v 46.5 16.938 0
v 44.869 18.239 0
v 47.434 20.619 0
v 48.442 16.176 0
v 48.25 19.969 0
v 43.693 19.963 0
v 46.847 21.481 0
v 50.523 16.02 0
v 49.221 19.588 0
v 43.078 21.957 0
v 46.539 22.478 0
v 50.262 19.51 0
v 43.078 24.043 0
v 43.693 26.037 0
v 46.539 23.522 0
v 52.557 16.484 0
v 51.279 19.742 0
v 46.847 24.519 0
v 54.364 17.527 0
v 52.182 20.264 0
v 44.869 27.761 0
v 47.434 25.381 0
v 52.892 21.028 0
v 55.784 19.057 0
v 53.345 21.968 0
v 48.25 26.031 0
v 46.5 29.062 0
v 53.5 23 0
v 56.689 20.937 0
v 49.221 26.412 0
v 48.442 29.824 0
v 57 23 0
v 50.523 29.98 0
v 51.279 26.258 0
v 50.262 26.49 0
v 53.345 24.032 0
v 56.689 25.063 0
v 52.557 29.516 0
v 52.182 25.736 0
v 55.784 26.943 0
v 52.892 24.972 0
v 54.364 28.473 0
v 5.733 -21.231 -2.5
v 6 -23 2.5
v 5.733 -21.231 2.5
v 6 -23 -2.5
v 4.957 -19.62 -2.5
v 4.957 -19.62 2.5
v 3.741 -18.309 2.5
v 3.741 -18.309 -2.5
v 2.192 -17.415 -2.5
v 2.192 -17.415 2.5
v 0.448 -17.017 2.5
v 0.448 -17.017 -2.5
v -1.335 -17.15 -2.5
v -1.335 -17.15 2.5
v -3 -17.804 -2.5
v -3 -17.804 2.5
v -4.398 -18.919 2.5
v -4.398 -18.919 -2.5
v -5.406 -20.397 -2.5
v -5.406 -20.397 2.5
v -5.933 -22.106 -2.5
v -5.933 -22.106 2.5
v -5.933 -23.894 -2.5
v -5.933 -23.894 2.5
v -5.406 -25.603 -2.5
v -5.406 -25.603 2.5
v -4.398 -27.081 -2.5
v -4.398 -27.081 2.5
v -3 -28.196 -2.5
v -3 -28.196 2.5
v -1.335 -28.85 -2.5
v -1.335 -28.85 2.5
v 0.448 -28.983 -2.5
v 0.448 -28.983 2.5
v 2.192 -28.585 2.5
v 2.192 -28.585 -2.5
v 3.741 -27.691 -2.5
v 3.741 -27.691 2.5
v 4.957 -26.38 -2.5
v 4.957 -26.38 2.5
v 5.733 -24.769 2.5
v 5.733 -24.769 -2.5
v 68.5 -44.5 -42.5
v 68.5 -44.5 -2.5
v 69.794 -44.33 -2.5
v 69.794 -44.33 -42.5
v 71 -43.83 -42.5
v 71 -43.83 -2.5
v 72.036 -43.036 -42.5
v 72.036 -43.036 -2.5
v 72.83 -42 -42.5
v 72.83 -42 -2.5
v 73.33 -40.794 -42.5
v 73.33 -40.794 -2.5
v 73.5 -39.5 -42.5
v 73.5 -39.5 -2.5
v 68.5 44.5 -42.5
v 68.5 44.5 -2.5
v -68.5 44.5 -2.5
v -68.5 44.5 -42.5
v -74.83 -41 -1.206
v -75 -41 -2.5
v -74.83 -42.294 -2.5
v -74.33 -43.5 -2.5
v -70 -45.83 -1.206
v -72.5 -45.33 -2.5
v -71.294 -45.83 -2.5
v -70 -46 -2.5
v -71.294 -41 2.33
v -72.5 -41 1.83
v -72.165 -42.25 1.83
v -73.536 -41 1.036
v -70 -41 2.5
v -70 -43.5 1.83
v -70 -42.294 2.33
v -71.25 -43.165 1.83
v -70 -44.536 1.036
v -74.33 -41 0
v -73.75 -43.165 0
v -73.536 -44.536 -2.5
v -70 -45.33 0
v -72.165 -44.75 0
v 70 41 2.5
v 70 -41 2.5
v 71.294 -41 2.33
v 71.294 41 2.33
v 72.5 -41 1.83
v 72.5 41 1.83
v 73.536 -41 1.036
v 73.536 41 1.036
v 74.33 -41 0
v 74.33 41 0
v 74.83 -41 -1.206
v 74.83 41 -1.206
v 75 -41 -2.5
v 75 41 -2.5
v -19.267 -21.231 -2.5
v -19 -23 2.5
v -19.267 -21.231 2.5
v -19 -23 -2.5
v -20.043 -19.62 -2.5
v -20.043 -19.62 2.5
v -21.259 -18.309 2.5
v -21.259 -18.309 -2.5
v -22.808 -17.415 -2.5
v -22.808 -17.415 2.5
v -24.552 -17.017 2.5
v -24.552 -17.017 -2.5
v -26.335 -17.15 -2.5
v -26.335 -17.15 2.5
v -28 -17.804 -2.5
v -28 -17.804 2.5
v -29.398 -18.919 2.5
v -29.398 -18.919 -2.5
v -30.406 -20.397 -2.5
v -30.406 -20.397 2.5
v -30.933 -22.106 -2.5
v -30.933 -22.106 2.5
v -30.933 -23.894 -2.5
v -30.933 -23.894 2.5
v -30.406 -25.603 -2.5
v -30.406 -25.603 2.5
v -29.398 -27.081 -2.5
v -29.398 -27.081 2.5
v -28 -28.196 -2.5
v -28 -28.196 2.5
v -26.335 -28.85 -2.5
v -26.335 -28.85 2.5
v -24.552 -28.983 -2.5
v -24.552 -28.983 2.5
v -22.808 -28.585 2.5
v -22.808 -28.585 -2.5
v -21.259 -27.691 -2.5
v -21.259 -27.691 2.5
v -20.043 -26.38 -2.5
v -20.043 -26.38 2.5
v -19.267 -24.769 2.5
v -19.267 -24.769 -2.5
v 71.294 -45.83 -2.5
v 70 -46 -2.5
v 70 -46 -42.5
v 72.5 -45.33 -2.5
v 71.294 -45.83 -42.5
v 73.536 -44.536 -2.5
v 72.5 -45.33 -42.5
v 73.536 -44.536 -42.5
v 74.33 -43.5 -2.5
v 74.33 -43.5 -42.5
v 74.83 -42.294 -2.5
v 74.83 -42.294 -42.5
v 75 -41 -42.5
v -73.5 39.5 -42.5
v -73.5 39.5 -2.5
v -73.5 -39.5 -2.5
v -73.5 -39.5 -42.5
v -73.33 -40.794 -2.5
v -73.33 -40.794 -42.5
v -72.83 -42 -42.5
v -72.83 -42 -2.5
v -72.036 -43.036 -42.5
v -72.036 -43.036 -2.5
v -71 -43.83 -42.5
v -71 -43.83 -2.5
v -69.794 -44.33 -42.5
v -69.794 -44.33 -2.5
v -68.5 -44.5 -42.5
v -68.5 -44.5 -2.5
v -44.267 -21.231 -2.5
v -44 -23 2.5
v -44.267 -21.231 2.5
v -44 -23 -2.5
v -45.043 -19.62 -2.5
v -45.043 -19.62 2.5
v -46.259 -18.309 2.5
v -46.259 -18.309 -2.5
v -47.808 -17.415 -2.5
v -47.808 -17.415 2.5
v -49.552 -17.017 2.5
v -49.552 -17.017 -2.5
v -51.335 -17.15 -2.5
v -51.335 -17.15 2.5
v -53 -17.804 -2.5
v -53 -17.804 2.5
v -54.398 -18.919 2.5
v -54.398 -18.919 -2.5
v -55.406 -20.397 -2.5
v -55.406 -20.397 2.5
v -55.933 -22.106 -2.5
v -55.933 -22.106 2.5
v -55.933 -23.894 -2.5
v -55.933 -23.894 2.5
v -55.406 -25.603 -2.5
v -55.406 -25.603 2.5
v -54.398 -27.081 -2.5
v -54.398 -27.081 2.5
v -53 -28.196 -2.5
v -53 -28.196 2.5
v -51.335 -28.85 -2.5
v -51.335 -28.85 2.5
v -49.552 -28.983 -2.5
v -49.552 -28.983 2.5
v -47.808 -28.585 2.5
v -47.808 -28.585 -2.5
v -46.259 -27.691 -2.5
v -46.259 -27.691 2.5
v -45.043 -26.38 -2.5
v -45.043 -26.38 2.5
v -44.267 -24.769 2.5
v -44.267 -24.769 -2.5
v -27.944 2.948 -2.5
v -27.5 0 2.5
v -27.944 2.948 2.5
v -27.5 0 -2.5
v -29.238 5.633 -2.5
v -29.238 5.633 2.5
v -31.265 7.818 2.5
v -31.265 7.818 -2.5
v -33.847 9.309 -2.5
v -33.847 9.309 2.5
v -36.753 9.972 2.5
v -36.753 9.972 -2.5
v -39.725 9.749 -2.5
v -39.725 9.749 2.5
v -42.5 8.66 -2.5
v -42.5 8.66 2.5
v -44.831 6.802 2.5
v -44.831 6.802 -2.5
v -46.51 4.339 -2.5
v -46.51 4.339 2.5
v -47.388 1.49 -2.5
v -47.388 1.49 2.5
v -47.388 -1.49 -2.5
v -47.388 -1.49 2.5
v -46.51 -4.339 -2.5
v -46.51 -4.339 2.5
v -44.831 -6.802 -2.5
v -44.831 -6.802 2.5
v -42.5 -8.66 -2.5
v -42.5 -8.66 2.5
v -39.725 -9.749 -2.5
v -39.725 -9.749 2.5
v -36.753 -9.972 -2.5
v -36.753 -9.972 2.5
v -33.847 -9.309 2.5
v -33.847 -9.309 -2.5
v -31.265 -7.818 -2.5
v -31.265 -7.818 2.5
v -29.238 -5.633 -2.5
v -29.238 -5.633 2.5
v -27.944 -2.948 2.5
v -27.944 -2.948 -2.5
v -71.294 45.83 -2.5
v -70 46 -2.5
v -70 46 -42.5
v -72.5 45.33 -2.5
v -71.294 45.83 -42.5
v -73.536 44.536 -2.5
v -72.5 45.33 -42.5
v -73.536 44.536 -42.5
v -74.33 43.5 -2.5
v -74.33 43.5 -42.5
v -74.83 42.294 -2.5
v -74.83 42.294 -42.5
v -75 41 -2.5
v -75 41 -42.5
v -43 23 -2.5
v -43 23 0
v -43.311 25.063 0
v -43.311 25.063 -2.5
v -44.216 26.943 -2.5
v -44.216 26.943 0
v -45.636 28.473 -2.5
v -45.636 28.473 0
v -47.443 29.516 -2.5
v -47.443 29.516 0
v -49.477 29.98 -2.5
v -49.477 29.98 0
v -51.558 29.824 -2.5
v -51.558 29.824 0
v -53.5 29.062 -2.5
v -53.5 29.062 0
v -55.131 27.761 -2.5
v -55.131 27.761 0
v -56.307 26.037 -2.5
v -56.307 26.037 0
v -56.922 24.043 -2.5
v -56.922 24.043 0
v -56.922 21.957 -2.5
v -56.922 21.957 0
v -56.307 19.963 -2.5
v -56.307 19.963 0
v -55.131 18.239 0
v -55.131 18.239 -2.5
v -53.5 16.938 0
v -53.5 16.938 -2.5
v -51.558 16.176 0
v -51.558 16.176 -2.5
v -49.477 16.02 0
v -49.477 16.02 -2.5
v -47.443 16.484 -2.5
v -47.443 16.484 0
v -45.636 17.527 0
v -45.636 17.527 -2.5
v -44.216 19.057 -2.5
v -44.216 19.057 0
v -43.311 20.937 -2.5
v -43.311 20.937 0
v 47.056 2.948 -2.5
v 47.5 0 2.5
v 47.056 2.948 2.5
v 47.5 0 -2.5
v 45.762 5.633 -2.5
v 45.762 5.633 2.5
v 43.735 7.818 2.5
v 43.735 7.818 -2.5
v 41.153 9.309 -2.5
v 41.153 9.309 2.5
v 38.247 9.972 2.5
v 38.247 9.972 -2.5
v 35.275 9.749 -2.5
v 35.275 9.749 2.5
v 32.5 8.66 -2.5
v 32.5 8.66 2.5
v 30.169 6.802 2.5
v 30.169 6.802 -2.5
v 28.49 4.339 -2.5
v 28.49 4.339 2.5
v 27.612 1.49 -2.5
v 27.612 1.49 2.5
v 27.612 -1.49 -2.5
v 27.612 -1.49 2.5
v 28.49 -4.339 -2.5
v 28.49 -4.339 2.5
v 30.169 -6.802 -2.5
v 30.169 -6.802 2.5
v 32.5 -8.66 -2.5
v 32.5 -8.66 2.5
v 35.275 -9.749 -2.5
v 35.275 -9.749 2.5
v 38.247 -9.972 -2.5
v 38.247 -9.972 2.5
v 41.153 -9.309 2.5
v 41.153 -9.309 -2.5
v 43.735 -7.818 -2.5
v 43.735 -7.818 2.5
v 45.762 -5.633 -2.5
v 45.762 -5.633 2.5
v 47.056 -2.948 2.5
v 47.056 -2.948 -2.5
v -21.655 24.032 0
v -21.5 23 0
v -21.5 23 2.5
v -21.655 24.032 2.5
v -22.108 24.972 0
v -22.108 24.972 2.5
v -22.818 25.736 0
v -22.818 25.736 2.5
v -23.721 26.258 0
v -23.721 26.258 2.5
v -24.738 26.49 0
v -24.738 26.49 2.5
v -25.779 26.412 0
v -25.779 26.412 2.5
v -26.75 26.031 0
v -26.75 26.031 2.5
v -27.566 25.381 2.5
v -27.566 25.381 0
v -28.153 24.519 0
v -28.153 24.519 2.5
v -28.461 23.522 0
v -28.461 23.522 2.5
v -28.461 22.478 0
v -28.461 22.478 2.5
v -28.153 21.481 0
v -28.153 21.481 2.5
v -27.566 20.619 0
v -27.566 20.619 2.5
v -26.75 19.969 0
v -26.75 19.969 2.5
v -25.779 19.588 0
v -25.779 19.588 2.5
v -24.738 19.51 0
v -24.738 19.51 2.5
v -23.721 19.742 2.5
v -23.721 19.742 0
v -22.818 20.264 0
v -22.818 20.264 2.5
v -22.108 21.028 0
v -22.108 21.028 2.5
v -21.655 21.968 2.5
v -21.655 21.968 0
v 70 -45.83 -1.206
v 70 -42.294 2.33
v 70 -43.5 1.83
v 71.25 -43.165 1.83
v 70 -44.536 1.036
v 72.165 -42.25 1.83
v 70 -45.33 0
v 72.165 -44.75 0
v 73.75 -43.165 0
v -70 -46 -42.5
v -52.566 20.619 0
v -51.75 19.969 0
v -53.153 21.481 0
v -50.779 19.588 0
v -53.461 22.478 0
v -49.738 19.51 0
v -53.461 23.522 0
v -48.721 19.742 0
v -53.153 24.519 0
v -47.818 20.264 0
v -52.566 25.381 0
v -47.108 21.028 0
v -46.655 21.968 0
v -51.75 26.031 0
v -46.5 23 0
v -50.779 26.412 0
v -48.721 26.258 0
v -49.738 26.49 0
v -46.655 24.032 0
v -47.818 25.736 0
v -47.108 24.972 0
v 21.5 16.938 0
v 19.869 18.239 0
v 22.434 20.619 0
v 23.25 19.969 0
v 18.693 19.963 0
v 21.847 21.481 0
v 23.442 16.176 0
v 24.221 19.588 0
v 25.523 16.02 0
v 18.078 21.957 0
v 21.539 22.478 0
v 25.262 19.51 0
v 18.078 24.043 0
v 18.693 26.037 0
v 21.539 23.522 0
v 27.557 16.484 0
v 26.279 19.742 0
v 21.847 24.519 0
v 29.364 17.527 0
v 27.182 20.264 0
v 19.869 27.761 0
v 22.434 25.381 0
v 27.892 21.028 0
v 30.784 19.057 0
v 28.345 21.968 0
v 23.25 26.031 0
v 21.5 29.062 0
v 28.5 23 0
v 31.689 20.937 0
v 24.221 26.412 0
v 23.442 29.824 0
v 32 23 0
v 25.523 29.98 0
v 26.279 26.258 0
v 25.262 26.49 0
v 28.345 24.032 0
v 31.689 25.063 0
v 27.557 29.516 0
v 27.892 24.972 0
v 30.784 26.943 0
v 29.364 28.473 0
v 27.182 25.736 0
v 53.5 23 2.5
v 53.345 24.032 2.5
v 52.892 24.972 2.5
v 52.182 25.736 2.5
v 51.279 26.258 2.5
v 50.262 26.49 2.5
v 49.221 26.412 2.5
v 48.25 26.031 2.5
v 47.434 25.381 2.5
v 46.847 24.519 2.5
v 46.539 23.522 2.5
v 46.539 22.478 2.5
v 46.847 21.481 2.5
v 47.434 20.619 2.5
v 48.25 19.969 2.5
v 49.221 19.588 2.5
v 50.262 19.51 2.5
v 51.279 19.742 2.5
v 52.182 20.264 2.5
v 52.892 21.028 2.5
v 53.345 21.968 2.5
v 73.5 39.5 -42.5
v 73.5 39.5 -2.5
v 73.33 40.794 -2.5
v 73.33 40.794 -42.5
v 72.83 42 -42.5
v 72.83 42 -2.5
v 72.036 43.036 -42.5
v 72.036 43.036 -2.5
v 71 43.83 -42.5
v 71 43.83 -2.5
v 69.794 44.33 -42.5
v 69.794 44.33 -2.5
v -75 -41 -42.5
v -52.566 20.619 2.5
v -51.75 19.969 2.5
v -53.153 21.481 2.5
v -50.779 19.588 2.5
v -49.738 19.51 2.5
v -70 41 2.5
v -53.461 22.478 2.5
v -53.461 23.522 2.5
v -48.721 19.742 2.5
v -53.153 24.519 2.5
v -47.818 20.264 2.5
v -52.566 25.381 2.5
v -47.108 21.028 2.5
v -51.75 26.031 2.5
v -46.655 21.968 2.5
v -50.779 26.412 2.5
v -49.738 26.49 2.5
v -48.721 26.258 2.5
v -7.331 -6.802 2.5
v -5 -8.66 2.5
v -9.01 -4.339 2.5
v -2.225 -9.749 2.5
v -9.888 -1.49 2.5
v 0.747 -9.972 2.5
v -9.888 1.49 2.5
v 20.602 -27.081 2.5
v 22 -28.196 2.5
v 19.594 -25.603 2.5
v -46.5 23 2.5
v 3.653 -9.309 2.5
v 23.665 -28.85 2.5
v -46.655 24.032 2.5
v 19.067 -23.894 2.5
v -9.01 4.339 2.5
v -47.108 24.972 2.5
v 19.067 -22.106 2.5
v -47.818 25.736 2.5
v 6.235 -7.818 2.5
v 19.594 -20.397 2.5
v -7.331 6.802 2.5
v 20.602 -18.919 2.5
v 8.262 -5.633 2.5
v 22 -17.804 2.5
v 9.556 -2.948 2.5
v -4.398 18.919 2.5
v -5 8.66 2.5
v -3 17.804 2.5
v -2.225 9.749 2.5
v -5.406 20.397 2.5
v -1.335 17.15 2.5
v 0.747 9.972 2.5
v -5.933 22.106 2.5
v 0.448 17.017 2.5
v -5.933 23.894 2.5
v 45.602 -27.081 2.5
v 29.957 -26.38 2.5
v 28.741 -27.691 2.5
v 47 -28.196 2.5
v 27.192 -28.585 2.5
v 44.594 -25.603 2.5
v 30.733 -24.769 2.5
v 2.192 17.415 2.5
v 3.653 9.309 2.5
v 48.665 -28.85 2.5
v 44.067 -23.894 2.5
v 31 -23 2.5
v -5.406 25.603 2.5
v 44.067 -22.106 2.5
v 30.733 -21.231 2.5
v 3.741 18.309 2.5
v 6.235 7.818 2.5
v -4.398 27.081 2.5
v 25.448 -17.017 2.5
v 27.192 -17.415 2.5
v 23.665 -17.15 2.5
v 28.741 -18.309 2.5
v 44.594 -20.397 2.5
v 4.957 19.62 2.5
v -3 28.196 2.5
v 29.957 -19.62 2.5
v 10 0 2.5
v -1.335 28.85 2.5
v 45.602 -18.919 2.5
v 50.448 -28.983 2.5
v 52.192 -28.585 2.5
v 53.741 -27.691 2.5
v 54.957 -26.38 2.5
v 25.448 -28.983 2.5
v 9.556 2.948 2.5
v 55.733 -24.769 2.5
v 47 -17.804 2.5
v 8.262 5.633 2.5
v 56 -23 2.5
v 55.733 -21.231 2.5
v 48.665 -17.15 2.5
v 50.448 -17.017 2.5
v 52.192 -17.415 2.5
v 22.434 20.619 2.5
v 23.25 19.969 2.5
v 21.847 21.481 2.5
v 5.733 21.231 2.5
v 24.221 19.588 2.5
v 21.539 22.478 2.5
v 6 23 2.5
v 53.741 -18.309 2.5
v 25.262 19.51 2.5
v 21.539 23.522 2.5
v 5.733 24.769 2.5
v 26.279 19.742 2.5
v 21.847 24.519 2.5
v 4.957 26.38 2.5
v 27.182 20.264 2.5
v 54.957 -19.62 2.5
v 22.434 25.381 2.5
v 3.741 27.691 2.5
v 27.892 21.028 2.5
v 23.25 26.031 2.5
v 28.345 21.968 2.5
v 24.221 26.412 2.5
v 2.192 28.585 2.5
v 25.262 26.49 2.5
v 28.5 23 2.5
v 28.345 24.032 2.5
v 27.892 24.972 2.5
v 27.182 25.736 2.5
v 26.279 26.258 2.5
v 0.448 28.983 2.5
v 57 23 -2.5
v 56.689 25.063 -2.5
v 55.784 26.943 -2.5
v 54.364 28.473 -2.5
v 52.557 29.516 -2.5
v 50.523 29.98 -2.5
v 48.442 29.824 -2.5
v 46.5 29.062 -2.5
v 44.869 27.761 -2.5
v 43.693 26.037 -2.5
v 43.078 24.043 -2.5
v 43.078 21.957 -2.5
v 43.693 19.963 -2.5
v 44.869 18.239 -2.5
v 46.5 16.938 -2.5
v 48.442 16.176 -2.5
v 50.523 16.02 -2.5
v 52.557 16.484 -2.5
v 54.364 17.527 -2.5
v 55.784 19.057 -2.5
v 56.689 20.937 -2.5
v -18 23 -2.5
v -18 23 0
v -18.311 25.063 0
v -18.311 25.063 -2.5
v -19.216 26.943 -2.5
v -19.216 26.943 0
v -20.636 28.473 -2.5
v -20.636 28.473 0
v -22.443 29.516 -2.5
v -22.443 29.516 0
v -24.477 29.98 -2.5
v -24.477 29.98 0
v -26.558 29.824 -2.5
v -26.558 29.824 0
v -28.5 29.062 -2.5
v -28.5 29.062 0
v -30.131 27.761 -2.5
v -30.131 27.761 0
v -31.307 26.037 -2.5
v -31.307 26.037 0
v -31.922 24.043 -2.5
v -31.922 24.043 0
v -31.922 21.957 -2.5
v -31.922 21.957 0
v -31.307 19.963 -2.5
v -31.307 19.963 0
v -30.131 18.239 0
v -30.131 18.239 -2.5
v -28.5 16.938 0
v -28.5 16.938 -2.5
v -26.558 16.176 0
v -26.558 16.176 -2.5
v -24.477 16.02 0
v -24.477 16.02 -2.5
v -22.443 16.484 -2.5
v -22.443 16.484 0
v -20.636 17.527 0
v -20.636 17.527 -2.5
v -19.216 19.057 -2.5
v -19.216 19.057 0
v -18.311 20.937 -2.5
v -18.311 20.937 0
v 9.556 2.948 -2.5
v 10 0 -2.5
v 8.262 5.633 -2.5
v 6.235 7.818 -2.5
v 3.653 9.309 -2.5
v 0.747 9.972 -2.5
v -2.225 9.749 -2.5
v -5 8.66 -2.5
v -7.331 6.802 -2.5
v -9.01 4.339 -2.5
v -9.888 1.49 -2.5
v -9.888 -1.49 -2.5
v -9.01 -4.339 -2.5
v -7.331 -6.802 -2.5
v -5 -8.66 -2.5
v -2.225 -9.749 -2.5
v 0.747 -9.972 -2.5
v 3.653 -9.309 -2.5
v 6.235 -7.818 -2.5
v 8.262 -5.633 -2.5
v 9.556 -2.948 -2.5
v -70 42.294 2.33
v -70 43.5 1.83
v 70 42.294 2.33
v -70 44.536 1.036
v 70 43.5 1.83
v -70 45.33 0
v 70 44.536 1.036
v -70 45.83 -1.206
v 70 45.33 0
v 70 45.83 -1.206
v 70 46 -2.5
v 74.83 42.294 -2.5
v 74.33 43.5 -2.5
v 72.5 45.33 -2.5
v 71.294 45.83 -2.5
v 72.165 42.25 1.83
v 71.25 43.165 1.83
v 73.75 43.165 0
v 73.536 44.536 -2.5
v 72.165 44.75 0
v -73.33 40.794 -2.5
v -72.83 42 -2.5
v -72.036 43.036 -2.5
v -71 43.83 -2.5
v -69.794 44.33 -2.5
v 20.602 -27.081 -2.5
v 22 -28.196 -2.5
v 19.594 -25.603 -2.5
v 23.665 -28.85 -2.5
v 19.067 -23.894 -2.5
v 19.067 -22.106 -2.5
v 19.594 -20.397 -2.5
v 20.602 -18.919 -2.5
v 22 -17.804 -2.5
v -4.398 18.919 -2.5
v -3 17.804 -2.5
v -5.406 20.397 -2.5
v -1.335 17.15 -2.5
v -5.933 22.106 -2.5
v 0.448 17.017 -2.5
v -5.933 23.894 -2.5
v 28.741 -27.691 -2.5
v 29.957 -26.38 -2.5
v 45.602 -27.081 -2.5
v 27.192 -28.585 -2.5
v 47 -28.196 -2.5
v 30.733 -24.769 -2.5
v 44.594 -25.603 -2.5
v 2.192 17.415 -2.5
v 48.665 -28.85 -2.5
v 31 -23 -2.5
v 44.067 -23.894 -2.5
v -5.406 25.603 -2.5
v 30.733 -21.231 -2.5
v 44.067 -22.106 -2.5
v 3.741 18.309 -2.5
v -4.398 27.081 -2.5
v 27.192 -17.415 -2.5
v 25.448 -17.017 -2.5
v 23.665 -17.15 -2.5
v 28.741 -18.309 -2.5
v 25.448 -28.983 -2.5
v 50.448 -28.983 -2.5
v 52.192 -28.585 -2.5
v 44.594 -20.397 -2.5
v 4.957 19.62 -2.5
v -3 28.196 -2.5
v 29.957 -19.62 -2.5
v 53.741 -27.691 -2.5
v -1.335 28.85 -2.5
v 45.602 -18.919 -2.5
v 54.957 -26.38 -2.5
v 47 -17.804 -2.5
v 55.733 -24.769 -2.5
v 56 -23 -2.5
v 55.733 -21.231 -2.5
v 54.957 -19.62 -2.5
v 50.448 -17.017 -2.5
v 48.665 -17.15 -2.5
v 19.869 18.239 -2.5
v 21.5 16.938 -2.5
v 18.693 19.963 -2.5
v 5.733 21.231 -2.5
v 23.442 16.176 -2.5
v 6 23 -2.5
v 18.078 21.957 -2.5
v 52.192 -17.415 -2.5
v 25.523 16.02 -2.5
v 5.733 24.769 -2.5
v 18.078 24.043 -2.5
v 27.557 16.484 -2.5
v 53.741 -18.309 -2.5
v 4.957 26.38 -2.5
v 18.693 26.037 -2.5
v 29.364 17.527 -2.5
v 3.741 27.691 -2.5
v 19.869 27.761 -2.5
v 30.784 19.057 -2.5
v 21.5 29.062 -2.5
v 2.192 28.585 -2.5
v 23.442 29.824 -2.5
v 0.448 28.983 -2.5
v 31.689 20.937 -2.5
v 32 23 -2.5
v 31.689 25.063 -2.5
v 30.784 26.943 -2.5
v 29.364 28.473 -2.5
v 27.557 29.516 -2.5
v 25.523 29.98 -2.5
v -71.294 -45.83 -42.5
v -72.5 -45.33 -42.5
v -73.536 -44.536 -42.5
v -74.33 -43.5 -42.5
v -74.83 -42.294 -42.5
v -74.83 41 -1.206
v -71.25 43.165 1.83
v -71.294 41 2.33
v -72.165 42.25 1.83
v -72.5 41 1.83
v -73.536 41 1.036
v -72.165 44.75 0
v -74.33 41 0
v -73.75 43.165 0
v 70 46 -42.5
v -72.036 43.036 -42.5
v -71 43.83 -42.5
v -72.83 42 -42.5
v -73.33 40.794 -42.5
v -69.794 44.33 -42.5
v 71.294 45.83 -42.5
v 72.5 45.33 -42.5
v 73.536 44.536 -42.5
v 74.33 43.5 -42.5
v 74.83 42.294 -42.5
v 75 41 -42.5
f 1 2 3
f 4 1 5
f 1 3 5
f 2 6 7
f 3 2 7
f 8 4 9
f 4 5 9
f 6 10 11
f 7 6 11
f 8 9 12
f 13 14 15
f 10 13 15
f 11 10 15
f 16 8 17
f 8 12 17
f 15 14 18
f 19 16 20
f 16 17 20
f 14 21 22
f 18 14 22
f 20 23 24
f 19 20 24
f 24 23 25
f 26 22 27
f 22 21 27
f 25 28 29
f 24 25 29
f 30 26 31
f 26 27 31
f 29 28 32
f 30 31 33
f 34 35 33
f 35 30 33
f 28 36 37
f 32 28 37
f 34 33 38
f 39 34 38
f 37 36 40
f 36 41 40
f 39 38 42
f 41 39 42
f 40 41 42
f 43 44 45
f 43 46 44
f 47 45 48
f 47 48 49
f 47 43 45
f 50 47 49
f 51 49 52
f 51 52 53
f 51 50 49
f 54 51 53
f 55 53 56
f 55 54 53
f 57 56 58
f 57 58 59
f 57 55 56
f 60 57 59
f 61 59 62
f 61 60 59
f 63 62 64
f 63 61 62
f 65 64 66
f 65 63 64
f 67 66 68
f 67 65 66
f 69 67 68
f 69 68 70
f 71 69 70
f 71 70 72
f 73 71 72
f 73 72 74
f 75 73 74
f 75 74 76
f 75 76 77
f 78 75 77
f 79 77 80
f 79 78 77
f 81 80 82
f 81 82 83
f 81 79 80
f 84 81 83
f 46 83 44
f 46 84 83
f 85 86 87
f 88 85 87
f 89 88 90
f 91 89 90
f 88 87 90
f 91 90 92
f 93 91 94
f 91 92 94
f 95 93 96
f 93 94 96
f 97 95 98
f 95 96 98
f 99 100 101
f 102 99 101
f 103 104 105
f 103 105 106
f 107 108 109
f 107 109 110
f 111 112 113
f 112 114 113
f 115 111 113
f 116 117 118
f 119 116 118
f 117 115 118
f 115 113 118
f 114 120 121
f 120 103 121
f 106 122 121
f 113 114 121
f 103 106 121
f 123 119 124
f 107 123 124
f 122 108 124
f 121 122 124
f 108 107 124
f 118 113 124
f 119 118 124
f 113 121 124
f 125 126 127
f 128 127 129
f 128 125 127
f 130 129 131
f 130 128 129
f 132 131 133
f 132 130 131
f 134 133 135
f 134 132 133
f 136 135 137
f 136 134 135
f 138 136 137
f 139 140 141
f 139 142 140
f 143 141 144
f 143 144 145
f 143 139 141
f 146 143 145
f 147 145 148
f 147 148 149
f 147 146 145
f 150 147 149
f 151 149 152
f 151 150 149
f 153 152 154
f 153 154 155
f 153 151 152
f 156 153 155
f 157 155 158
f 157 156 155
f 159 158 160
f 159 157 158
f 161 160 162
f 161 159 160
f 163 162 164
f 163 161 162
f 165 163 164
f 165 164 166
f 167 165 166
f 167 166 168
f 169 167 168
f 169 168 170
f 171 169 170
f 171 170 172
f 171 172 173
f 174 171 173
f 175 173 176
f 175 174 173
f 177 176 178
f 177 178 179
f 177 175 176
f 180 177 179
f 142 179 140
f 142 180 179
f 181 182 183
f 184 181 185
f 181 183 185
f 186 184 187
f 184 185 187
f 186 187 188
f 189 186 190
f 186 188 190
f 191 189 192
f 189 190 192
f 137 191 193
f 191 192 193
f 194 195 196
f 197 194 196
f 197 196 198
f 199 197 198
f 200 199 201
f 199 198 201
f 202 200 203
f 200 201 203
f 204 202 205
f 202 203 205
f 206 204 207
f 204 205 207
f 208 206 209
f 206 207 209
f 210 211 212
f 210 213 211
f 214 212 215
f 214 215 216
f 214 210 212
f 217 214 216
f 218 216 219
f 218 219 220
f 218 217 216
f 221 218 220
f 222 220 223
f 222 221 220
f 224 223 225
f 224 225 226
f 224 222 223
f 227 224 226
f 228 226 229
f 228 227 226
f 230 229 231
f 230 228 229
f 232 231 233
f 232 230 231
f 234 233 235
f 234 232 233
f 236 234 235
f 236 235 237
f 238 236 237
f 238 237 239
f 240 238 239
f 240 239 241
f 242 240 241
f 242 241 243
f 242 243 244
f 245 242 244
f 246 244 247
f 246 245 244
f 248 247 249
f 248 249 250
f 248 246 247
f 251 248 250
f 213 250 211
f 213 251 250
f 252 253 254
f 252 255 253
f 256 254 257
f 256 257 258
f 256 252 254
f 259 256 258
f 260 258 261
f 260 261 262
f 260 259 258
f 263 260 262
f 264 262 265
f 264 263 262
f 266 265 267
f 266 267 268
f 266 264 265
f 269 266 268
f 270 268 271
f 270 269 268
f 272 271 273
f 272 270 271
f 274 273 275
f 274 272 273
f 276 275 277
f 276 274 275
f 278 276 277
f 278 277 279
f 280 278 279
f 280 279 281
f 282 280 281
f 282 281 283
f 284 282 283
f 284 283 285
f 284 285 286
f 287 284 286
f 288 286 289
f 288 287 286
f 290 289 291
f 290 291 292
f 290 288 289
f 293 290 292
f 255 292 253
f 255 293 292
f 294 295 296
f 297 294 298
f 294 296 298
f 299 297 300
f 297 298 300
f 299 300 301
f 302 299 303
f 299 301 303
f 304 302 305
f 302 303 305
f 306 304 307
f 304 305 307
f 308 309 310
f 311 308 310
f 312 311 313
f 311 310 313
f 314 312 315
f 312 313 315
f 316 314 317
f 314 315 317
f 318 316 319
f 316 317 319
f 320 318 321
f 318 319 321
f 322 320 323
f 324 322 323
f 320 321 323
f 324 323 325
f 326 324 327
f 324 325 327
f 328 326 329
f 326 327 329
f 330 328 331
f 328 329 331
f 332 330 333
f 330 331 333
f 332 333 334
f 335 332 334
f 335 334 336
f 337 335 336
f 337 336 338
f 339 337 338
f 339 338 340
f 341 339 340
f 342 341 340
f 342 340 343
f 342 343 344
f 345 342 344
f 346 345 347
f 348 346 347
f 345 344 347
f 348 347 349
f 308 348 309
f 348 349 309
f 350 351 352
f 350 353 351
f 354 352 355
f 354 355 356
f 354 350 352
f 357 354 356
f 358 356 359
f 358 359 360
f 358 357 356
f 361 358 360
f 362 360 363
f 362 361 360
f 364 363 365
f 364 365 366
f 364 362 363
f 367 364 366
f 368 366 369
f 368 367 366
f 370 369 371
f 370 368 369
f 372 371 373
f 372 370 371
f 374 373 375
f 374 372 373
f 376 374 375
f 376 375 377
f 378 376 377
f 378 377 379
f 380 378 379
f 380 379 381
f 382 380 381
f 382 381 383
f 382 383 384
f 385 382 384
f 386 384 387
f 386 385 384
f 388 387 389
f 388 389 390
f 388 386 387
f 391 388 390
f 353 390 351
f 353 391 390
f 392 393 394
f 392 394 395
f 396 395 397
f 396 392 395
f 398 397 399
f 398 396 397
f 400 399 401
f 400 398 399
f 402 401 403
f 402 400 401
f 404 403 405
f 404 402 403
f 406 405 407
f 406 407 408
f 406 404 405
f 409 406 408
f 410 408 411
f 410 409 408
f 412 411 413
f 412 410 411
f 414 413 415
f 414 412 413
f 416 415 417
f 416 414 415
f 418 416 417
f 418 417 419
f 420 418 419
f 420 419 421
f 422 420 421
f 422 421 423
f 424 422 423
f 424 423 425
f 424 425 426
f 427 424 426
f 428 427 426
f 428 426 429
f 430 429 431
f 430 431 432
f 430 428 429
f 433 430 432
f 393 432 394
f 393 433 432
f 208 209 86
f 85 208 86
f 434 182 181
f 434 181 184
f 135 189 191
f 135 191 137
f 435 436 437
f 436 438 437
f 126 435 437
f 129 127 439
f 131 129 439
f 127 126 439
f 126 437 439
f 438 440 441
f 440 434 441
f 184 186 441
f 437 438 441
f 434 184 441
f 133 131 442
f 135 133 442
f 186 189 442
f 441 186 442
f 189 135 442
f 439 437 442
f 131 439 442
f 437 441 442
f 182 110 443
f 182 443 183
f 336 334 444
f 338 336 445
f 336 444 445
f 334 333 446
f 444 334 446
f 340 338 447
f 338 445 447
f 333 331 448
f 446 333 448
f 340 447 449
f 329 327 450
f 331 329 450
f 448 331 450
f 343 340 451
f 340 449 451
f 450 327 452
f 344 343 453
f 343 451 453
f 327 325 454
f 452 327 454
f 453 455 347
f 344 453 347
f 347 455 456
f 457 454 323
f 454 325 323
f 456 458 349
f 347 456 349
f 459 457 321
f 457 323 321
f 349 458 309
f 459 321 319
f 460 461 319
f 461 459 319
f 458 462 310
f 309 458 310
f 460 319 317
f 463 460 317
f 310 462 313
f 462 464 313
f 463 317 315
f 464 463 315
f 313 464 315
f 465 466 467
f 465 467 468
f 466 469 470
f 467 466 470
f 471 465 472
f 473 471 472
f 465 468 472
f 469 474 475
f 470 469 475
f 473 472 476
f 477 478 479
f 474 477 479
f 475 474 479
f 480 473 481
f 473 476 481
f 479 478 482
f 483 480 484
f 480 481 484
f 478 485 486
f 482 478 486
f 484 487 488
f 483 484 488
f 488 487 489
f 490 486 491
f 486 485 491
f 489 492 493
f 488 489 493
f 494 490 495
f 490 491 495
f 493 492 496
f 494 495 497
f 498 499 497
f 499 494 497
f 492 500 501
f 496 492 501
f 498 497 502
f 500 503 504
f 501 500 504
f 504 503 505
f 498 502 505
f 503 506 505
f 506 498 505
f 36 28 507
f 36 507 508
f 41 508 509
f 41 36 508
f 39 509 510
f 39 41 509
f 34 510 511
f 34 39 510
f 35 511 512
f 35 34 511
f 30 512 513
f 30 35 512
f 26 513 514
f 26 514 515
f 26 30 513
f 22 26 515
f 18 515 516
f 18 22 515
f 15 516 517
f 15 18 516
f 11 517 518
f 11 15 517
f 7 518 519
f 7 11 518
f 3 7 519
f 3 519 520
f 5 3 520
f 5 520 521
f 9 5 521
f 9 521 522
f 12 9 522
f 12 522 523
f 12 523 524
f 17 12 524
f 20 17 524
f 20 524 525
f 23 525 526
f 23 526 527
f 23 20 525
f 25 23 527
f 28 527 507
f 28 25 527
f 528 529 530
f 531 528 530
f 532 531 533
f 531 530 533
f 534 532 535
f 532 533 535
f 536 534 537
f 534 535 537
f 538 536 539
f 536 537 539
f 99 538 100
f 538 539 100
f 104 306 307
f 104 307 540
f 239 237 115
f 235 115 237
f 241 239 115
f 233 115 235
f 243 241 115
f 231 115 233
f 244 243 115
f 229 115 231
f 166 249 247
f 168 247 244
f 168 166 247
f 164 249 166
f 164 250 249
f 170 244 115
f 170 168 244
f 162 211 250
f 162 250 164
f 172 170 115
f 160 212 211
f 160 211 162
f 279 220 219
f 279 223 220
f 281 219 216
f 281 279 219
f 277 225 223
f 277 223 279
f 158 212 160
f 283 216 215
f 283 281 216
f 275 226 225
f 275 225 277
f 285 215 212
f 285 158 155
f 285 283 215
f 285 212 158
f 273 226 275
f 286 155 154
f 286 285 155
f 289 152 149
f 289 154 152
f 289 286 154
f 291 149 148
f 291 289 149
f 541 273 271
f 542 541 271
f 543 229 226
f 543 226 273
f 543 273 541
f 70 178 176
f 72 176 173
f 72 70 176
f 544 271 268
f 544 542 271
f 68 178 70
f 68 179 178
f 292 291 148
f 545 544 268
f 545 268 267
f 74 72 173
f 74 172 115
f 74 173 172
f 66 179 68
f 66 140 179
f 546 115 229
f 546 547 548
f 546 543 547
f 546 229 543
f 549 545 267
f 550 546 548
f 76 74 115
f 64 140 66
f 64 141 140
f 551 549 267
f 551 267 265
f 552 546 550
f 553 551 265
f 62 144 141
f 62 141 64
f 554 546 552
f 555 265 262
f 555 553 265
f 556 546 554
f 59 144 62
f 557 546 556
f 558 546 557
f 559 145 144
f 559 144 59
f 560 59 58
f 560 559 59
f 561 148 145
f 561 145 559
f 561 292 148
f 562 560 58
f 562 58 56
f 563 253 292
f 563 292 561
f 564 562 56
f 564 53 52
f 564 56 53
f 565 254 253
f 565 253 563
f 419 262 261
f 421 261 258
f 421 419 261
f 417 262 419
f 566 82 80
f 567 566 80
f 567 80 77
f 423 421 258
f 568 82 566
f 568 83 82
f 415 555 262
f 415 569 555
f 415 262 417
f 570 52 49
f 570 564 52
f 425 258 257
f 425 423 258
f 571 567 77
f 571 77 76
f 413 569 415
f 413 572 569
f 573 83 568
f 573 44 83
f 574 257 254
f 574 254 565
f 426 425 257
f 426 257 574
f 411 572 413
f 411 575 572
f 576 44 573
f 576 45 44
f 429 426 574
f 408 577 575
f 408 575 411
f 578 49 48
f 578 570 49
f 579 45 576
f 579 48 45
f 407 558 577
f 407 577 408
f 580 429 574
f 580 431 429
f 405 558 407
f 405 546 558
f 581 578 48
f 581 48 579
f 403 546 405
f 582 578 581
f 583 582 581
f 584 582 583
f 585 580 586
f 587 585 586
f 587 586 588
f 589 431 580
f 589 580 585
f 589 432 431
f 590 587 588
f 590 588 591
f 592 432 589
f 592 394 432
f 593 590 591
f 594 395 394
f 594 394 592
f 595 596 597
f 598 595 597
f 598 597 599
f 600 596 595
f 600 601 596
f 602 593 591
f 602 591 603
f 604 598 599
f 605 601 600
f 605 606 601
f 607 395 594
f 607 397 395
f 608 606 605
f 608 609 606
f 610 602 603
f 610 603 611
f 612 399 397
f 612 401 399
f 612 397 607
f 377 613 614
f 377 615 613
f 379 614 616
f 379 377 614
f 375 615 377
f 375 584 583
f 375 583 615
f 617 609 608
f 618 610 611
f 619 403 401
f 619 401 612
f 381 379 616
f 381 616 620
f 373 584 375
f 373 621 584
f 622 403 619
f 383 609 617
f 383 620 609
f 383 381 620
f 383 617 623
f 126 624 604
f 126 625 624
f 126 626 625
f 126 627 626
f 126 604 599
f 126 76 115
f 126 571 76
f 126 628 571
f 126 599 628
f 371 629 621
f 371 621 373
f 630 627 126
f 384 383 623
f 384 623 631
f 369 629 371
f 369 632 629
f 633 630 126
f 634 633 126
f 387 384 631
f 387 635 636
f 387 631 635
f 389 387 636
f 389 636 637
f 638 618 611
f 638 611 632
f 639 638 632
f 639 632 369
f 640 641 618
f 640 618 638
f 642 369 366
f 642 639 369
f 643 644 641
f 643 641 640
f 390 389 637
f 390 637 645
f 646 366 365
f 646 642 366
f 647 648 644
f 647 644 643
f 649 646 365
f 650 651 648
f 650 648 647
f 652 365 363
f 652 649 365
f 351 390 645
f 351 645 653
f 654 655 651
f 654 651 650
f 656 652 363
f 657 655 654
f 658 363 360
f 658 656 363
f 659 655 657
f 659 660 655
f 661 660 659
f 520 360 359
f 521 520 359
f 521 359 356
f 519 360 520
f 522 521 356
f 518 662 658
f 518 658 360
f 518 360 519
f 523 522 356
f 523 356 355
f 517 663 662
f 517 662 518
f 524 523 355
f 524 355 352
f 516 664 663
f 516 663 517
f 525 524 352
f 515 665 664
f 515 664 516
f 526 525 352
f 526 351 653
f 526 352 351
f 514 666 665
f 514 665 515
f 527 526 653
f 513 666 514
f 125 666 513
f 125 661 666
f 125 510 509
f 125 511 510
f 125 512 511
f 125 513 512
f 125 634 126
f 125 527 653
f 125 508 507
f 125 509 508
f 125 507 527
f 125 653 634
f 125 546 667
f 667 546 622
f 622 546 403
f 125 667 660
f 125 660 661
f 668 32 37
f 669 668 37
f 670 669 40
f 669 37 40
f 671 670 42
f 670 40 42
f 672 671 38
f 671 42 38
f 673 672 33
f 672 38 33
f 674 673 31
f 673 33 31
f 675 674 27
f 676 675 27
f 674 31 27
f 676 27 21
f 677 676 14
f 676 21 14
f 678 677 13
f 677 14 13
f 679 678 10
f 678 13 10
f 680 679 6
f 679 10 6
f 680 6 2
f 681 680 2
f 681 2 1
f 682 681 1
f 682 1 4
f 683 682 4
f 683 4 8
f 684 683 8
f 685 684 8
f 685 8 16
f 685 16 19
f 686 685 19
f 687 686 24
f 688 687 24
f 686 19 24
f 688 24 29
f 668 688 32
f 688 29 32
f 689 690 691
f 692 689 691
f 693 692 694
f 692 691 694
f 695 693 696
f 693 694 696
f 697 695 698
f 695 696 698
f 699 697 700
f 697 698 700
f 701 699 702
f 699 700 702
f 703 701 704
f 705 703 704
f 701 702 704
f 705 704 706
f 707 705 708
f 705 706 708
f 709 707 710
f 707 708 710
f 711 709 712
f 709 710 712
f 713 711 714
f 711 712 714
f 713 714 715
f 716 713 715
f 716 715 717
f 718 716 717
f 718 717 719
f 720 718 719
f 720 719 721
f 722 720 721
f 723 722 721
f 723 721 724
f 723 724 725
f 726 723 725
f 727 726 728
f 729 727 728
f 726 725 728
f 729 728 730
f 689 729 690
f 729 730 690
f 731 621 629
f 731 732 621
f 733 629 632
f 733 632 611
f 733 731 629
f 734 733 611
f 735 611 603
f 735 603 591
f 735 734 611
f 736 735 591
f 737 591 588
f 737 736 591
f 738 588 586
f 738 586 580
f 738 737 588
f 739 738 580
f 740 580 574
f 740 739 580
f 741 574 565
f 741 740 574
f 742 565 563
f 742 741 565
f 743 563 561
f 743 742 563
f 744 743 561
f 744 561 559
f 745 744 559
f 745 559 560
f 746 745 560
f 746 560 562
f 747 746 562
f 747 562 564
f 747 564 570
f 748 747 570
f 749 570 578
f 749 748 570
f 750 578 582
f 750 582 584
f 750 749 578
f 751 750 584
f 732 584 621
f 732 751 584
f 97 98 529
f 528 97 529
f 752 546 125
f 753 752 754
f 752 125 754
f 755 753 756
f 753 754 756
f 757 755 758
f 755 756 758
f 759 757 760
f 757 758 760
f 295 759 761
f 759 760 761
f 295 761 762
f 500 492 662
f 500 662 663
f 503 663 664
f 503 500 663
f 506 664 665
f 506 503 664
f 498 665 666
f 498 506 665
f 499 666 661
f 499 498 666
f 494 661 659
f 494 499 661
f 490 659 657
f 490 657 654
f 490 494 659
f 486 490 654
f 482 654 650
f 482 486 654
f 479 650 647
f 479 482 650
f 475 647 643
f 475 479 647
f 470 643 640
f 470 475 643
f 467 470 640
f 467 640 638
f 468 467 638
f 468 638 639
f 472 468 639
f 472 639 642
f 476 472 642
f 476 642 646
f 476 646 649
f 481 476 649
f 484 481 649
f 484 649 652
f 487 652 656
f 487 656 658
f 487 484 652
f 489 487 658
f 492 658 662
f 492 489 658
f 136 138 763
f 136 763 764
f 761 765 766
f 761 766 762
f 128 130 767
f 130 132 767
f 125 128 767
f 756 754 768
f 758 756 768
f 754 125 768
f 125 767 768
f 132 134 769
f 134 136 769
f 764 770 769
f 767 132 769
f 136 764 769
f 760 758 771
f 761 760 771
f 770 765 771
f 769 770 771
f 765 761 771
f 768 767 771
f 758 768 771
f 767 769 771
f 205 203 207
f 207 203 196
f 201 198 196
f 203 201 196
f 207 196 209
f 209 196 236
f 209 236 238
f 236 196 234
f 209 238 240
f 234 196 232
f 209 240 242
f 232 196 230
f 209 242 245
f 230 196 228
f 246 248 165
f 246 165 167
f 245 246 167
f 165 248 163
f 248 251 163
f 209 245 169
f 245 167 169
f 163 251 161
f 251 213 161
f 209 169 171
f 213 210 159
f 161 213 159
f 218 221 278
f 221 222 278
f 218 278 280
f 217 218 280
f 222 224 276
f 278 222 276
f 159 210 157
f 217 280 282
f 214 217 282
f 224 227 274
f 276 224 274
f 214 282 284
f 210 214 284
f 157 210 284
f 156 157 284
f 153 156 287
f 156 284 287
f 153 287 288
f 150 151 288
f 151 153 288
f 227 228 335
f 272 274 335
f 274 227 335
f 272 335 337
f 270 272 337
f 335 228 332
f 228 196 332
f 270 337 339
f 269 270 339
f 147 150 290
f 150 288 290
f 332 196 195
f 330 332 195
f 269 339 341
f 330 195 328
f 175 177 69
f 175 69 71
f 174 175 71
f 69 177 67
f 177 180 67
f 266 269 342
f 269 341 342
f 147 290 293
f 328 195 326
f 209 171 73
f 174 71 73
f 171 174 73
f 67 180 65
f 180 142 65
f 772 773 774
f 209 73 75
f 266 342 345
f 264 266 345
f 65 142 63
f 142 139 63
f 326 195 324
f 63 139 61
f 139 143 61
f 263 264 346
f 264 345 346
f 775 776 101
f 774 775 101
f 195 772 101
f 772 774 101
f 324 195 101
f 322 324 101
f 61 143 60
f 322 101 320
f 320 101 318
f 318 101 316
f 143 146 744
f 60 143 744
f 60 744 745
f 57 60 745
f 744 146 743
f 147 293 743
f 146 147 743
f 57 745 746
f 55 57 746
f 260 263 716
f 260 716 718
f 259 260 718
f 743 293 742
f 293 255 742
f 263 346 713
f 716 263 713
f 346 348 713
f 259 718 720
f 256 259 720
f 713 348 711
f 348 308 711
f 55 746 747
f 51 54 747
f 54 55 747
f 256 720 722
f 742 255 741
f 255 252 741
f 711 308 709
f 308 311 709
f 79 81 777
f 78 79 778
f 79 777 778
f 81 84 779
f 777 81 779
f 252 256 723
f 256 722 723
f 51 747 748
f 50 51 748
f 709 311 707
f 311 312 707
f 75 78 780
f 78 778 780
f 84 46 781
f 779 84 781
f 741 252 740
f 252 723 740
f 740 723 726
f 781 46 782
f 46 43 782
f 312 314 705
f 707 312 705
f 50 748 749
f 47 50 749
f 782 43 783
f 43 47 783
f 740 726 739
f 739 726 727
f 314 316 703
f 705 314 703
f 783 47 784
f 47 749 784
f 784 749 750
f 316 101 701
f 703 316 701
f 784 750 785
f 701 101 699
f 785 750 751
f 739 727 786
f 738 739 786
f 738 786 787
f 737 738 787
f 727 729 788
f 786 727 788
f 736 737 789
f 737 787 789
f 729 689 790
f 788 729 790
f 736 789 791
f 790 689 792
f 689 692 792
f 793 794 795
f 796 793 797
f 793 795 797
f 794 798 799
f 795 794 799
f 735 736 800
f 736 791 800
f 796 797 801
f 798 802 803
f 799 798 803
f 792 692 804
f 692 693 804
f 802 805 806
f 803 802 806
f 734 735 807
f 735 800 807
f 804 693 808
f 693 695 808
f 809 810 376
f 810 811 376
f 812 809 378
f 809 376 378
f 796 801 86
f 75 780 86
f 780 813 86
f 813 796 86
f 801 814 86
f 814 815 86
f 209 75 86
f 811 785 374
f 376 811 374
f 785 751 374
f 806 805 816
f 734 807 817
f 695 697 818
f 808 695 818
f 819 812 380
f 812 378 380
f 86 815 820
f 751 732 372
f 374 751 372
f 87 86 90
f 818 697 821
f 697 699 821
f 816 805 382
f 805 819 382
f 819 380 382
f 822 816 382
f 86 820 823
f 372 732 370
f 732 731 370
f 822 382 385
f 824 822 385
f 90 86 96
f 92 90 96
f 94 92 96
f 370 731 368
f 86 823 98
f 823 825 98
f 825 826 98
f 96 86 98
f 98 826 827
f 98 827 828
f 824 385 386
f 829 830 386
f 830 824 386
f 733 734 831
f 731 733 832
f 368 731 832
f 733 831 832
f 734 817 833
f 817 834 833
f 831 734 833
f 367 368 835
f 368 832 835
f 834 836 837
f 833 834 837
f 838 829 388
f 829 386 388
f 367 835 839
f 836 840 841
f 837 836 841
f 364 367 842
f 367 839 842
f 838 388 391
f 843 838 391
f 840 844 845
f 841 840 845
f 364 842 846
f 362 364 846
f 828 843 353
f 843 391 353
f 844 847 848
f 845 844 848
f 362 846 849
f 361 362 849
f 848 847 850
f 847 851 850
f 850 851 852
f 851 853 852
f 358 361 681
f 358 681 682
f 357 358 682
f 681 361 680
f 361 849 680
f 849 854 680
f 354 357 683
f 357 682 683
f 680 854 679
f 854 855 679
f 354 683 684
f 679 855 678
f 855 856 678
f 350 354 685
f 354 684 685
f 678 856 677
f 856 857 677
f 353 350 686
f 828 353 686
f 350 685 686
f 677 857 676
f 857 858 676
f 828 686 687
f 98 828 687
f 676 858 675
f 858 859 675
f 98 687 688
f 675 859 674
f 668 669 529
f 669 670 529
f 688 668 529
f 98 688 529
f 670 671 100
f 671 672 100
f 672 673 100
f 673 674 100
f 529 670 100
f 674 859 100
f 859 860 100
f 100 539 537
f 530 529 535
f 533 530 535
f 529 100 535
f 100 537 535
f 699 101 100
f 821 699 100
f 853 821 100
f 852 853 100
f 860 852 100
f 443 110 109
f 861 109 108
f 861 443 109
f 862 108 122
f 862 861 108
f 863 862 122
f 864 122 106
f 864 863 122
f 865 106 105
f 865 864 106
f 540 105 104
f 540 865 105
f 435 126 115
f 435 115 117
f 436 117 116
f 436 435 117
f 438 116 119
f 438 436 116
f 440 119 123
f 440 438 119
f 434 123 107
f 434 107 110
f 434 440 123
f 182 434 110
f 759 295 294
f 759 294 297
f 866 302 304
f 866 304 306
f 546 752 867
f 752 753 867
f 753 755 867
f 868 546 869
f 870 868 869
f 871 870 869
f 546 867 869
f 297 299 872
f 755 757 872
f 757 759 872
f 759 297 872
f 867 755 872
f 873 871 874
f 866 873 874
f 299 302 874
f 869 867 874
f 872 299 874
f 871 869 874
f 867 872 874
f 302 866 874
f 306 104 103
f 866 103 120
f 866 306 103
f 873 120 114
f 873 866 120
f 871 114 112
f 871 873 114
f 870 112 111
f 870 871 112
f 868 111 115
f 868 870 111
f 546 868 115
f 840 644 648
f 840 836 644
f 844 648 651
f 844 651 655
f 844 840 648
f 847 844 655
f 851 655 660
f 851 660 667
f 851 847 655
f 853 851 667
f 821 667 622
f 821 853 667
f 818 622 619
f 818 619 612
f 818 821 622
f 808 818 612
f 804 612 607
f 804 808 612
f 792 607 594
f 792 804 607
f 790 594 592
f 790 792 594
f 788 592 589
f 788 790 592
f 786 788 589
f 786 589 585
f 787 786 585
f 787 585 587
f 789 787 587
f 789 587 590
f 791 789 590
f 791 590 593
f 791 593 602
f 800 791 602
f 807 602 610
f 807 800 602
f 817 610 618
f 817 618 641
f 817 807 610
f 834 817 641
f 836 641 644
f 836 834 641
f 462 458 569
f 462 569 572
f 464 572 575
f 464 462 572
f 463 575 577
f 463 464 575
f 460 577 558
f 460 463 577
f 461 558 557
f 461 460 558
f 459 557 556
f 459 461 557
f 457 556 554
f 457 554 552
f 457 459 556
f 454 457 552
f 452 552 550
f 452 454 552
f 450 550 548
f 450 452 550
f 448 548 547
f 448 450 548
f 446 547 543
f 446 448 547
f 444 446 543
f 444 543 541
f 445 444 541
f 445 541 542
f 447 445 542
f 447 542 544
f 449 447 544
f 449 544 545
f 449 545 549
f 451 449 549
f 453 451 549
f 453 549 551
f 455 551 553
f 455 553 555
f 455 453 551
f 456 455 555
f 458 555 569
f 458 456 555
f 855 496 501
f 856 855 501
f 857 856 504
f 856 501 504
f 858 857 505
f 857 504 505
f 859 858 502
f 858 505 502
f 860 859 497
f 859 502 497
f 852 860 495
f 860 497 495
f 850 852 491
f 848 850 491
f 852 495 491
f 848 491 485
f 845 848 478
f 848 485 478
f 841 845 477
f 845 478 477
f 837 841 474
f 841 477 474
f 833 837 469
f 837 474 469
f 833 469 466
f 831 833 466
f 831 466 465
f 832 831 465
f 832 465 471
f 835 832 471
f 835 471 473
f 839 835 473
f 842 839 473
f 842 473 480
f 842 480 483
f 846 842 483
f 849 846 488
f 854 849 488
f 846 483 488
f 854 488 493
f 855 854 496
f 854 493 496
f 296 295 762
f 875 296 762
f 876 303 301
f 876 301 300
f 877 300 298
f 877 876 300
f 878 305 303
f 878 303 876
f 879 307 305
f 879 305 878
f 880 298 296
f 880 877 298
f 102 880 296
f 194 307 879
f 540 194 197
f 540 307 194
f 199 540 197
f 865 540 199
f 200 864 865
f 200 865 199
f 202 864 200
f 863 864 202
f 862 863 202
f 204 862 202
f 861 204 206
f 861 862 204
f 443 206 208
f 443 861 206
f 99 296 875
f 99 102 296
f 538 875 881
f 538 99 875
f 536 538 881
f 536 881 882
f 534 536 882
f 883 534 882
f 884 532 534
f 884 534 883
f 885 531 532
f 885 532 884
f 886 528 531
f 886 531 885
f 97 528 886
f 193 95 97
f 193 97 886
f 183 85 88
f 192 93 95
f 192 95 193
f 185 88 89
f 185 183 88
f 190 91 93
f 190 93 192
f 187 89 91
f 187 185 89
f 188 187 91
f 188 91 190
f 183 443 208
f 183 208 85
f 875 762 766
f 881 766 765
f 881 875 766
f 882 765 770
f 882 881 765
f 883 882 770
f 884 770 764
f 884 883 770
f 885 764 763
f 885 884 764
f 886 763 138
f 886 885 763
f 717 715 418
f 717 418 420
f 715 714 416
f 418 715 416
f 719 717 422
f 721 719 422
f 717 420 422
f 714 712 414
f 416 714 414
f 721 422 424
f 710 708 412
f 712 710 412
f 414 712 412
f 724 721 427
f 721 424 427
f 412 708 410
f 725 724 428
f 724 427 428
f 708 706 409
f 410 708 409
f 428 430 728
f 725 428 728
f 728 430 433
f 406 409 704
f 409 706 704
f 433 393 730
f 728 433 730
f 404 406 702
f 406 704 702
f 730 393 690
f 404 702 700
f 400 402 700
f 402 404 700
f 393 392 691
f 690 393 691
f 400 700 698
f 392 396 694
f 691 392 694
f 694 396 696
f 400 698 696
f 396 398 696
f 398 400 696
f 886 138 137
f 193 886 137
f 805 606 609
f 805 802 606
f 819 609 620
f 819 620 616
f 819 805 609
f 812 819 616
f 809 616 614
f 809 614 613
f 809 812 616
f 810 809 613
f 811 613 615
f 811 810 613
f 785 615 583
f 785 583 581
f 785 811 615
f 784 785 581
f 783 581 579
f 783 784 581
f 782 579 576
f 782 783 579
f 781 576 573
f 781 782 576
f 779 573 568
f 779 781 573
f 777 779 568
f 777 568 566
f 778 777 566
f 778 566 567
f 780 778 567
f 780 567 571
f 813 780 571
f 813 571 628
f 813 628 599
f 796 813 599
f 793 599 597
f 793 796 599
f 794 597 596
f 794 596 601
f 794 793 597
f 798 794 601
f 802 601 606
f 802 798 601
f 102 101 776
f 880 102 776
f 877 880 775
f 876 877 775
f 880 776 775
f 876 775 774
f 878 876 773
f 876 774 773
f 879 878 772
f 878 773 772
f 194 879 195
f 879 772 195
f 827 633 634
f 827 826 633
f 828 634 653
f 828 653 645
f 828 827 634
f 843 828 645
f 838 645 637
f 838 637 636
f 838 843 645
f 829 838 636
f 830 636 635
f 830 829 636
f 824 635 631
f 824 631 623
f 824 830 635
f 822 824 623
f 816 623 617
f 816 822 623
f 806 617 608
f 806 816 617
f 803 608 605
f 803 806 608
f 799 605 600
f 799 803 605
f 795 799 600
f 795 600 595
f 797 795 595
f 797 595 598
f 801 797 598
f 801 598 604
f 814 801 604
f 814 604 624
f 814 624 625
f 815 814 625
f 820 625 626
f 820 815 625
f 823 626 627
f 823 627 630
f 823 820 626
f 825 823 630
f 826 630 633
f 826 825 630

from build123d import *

# Parameters (mm, degrees)
F0_W         = 150
F0_H         = 92
F0_R         = 6
F0_R_2       = 10
F0_R_3       = 3.5
F1_DEPTH     = 2.5
F2_W         = 150
F2_H         = 92
F2_R         = 6
F2_R_2       = 10
F2_R_3       = 7
F3_DEPTH     = 2.5
F4_R         = 4.99999
F5_W         = 150
F5_H         = 92
F6_DEPTH     = 40
F7_T1_DEPTH  = 57.5
F7_T4_ANGLE  = 90
F7_T6_ANGLE  = 90
F7_T8_ANGLE  = 90
F7_T10_ANGLE = 90


# Not quite as in the source:
# - a fillet or chamfer that OpenCascade refuses, or shapes differently, is made with other operations: its cross-section is extruded or revolved along the edge and cut away or added
# - a fillet or chamfer is up to 0.001 mm smaller than in the source, because OpenCascade refuses the exact size


with BuildPart() as f1:
    # F0 (on Top) → F1 (new body)
    with BuildSketch(Plane.XY):
        Rectangle(F0_W, F0_H)
        with Locations((-50, -23)):
            Circle(F0_R, mode=Mode.SUBTRACT)
        with Locations((-25, -23)):
            Circle(F0_R, mode=Mode.SUBTRACT)
        with Locations((0, -23)):
            Circle(F0_R, mode=Mode.SUBTRACT)
        with Locations((25, -23)):
            Circle(F0_R, mode=Mode.SUBTRACT)
        with Locations((50, -23)):
            Circle(F0_R, mode=Mode.SUBTRACT)
        with Locations((-37.5, 0)):
            Circle(F0_R_2, mode=Mode.SUBTRACT)
        with Locations((-50, 23)):
            Circle(F0_R_3, mode=Mode.SUBTRACT)
        with Locations((-25, 23)):
            Circle(F0_R_3, mode=Mode.SUBTRACT)
        Circle(F0_R_2, mode=Mode.SUBTRACT)
        with Locations((37.5, 0)):
            Circle(F0_R_2, mode=Mode.SUBTRACT)
        with Locations((0, 23)):
            Circle(F0_R, mode=Mode.SUBTRACT)
        with Locations((25, 23)):
            Circle(F0_R_3, mode=Mode.SUBTRACT)
        with Locations((50, 23)):
            Circle(F0_R_3, mode=Mode.SUBTRACT)
    extrude(amount=F1_DEPTH)

    # F2 (on Top) → F3 (join)
    with BuildSketch(Plane.XY):
        Rectangle(F2_W, F2_H)
        with Locations((-50, -23)):
            Circle(F2_R, mode=Mode.SUBTRACT)
        with Locations((-25, -23)):
            Circle(F2_R, mode=Mode.SUBTRACT)
        with Locations((0, -23)):
            Circle(F2_R, mode=Mode.SUBTRACT)
        with Locations((25, -23)):
            Circle(F2_R, mode=Mode.SUBTRACT)
        with Locations((50, -23)):
            Circle(F2_R, mode=Mode.SUBTRACT)
        with Locations((-37.5, 0)):
            Circle(F2_R_2, mode=Mode.SUBTRACT)
        with Locations((-50, 23)):
            Circle(F2_R_3, mode=Mode.SUBTRACT)
        with Locations((-25, 23)):
            Circle(F2_R_3, mode=Mode.SUBTRACT)
        Circle(F2_R_2, mode=Mode.SUBTRACT)
        with Locations((37.5, 0)):
            Circle(F2_R_2, mode=Mode.SUBTRACT)
        with Locations((0, 23)):
            Circle(F2_R, mode=Mode.SUBTRACT)
        with Locations((25, 23)):
            Circle(F2_R_3, mode=Mode.SUBTRACT)
        with Locations((50, 23)):
            Circle(F2_R_3, mode=Mode.SUBTRACT)
    extrude(amount=-F3_DEPTH)

    # F4 (radius 5 in the source; OpenCascade refuses exactly that, so slightly less here)
    f4_edges = [f1.edges().sort_by_distance(p)[0] for p in [
        (0, 46, 2.5),
        (-75, 0, 2.5),
        (0, -46, 2.5),
        (75, 0, 2.5),
    ]]
    fillet(f4_edges, radius=F4_R)

    # F5 (on face) → F6 (join)
    with BuildSketch(Plane(origin=(0, 0, -2.5), x_dir=(1, 0, 0), z_dir=(0, 0, -1))):
        Rectangle(F5_W, F5_H)
        with BuildLine():
            ThreePointArc((-73.5, 39.5), (-72.0355339059, 43.0355339059), (-68.5, 44.5))
            Line((-68.5, 44.5), (68.5, 44.5))
            ThreePointArc((68.5, 44.5), (72.0355339059, 43.0355339059), (73.5, 39.5))
            Line((73.5, 39.5), (73.5, -39.5))
            ThreePointArc((73.5, -39.5), (72.0355339059, -43.0355339059), (68.5, -44.5))
            Line((68.5, -44.5), (-68.5, -44.5))
            ThreePointArc((-68.5, -44.5), (-72.0355339059, -43.0355339059), (-73.5, -39.5))
            Line((-73.5, -39.5), (-73.5, 39.5))
        make_face(mode=Mode.SUBTRACT)
    extrude(amount=F6_DEPTH)

    # F7: fillet of radius 5 on 4 edges, made by hand

    # F7_s2 → F7_t1 (cut)
    with BuildSketch(Plane.XY.offset(-55)):
        with BuildLine():
            ThreePointArc((70, -46), (73.5355339059, -44.5355339059), (75, -41))
            Line((75, -41), (75, -46))
            Line((75, -46), (70, -46))
        make_face()
        with BuildLine():
            ThreePointArc((70, 46), (73.5355339059, 44.5355339059), (75, 41))
            Line((75, 41), (75, 46))
            Line((75, 46), (70, 46))
        make_face()
        with BuildLine():
            ThreePointArc((-70, 46), (-73.5355339059, 44.5355339059), (-75, 41))
            Line((-75, 41), (-75, 46))
            Line((-75, 46), (-70, 46))
        make_face()
        with BuildLine():
            ThreePointArc((-70, -46), (-73.5355339059, -44.5355339059), (-75, -41))
            Line((-75, -41), (-75, -46))
            Line((-75, -46), (-70, -46))
        make_face()
    extrude(amount=F7_T1_DEPTH, mode=Mode.SUBTRACT)

    # F7_s3 → F7_t4 (revolve, cut)
    with BuildSketch(Plane.XZ.offset(41)):
        with BuildLine():
            ThreePointArc((-70.00001, 2.5), (-73.5355368349, 1.0355368349), (-75, -2.49999))
            Line((-75, -2.49999), (-75, 2.5))
            Line((-75, 2.5), (-70.00001, 2.5))
        make_face()
    revolve(axis=Axis((-70, -41, 2.5), (0, 0, 1)), revolution_arc=F7_T4_ANGLE, mode=Mode.SUBTRACT)

    # F7_s5 → F7_t6 (revolve, cut)
    with BuildSketch(Plane.YZ.offset(-70)):
        with BuildLine():
            ThreePointArc((41.00001, 2.5), (44.5355368349, 1.0355368349), (46, -2.49999))
            Line((46, -2.49999), (46, 2.5))
            Line((46, 2.5), (41.00001, 2.5))
        make_face()
    revolve(axis=Axis((-70, 41, 2.5), (0, 0, 1)), revolution_arc=F7_T6_ANGLE, mode=Mode.SUBTRACT)

    # F7_s7 → F7_t8 (revolve, cut)
    with BuildSketch(Plane.XZ.offset(-41)):
        with BuildLine():
            ThreePointArc((70.00001, 2.5), (73.5355368349, 1.0355368349), (75, -2.49999))
            Line((75, -2.49999), (75, 2.5))
            Line((75, 2.5), (70.00001, 2.5))
        make_face()
    revolve(axis=Axis((70, 41, 2.5), (0, 0, 1)), revolution_arc=F7_T8_ANGLE, mode=Mode.SUBTRACT)

    # F7_s9 → F7_t10 (revolve, cut)
    with BuildSketch(Plane.YZ.offset(70)):
        with BuildLine():
            ThreePointArc((-41.00001, 2.5), (-44.5355368349, 1.0355368349), (-46, -2.49999))
            Line((-46, -2.49999), (-46, 2.5))
            Line((-46, 2.5), (-41.00001, 2.5))
        make_face()
    revolve(axis=Axis((70, -41, 2.5), (0, 0, 1)), revolution_arc=F7_T10_ANGLE, mode=Mode.SUBTRACT)


solid = f1.part
